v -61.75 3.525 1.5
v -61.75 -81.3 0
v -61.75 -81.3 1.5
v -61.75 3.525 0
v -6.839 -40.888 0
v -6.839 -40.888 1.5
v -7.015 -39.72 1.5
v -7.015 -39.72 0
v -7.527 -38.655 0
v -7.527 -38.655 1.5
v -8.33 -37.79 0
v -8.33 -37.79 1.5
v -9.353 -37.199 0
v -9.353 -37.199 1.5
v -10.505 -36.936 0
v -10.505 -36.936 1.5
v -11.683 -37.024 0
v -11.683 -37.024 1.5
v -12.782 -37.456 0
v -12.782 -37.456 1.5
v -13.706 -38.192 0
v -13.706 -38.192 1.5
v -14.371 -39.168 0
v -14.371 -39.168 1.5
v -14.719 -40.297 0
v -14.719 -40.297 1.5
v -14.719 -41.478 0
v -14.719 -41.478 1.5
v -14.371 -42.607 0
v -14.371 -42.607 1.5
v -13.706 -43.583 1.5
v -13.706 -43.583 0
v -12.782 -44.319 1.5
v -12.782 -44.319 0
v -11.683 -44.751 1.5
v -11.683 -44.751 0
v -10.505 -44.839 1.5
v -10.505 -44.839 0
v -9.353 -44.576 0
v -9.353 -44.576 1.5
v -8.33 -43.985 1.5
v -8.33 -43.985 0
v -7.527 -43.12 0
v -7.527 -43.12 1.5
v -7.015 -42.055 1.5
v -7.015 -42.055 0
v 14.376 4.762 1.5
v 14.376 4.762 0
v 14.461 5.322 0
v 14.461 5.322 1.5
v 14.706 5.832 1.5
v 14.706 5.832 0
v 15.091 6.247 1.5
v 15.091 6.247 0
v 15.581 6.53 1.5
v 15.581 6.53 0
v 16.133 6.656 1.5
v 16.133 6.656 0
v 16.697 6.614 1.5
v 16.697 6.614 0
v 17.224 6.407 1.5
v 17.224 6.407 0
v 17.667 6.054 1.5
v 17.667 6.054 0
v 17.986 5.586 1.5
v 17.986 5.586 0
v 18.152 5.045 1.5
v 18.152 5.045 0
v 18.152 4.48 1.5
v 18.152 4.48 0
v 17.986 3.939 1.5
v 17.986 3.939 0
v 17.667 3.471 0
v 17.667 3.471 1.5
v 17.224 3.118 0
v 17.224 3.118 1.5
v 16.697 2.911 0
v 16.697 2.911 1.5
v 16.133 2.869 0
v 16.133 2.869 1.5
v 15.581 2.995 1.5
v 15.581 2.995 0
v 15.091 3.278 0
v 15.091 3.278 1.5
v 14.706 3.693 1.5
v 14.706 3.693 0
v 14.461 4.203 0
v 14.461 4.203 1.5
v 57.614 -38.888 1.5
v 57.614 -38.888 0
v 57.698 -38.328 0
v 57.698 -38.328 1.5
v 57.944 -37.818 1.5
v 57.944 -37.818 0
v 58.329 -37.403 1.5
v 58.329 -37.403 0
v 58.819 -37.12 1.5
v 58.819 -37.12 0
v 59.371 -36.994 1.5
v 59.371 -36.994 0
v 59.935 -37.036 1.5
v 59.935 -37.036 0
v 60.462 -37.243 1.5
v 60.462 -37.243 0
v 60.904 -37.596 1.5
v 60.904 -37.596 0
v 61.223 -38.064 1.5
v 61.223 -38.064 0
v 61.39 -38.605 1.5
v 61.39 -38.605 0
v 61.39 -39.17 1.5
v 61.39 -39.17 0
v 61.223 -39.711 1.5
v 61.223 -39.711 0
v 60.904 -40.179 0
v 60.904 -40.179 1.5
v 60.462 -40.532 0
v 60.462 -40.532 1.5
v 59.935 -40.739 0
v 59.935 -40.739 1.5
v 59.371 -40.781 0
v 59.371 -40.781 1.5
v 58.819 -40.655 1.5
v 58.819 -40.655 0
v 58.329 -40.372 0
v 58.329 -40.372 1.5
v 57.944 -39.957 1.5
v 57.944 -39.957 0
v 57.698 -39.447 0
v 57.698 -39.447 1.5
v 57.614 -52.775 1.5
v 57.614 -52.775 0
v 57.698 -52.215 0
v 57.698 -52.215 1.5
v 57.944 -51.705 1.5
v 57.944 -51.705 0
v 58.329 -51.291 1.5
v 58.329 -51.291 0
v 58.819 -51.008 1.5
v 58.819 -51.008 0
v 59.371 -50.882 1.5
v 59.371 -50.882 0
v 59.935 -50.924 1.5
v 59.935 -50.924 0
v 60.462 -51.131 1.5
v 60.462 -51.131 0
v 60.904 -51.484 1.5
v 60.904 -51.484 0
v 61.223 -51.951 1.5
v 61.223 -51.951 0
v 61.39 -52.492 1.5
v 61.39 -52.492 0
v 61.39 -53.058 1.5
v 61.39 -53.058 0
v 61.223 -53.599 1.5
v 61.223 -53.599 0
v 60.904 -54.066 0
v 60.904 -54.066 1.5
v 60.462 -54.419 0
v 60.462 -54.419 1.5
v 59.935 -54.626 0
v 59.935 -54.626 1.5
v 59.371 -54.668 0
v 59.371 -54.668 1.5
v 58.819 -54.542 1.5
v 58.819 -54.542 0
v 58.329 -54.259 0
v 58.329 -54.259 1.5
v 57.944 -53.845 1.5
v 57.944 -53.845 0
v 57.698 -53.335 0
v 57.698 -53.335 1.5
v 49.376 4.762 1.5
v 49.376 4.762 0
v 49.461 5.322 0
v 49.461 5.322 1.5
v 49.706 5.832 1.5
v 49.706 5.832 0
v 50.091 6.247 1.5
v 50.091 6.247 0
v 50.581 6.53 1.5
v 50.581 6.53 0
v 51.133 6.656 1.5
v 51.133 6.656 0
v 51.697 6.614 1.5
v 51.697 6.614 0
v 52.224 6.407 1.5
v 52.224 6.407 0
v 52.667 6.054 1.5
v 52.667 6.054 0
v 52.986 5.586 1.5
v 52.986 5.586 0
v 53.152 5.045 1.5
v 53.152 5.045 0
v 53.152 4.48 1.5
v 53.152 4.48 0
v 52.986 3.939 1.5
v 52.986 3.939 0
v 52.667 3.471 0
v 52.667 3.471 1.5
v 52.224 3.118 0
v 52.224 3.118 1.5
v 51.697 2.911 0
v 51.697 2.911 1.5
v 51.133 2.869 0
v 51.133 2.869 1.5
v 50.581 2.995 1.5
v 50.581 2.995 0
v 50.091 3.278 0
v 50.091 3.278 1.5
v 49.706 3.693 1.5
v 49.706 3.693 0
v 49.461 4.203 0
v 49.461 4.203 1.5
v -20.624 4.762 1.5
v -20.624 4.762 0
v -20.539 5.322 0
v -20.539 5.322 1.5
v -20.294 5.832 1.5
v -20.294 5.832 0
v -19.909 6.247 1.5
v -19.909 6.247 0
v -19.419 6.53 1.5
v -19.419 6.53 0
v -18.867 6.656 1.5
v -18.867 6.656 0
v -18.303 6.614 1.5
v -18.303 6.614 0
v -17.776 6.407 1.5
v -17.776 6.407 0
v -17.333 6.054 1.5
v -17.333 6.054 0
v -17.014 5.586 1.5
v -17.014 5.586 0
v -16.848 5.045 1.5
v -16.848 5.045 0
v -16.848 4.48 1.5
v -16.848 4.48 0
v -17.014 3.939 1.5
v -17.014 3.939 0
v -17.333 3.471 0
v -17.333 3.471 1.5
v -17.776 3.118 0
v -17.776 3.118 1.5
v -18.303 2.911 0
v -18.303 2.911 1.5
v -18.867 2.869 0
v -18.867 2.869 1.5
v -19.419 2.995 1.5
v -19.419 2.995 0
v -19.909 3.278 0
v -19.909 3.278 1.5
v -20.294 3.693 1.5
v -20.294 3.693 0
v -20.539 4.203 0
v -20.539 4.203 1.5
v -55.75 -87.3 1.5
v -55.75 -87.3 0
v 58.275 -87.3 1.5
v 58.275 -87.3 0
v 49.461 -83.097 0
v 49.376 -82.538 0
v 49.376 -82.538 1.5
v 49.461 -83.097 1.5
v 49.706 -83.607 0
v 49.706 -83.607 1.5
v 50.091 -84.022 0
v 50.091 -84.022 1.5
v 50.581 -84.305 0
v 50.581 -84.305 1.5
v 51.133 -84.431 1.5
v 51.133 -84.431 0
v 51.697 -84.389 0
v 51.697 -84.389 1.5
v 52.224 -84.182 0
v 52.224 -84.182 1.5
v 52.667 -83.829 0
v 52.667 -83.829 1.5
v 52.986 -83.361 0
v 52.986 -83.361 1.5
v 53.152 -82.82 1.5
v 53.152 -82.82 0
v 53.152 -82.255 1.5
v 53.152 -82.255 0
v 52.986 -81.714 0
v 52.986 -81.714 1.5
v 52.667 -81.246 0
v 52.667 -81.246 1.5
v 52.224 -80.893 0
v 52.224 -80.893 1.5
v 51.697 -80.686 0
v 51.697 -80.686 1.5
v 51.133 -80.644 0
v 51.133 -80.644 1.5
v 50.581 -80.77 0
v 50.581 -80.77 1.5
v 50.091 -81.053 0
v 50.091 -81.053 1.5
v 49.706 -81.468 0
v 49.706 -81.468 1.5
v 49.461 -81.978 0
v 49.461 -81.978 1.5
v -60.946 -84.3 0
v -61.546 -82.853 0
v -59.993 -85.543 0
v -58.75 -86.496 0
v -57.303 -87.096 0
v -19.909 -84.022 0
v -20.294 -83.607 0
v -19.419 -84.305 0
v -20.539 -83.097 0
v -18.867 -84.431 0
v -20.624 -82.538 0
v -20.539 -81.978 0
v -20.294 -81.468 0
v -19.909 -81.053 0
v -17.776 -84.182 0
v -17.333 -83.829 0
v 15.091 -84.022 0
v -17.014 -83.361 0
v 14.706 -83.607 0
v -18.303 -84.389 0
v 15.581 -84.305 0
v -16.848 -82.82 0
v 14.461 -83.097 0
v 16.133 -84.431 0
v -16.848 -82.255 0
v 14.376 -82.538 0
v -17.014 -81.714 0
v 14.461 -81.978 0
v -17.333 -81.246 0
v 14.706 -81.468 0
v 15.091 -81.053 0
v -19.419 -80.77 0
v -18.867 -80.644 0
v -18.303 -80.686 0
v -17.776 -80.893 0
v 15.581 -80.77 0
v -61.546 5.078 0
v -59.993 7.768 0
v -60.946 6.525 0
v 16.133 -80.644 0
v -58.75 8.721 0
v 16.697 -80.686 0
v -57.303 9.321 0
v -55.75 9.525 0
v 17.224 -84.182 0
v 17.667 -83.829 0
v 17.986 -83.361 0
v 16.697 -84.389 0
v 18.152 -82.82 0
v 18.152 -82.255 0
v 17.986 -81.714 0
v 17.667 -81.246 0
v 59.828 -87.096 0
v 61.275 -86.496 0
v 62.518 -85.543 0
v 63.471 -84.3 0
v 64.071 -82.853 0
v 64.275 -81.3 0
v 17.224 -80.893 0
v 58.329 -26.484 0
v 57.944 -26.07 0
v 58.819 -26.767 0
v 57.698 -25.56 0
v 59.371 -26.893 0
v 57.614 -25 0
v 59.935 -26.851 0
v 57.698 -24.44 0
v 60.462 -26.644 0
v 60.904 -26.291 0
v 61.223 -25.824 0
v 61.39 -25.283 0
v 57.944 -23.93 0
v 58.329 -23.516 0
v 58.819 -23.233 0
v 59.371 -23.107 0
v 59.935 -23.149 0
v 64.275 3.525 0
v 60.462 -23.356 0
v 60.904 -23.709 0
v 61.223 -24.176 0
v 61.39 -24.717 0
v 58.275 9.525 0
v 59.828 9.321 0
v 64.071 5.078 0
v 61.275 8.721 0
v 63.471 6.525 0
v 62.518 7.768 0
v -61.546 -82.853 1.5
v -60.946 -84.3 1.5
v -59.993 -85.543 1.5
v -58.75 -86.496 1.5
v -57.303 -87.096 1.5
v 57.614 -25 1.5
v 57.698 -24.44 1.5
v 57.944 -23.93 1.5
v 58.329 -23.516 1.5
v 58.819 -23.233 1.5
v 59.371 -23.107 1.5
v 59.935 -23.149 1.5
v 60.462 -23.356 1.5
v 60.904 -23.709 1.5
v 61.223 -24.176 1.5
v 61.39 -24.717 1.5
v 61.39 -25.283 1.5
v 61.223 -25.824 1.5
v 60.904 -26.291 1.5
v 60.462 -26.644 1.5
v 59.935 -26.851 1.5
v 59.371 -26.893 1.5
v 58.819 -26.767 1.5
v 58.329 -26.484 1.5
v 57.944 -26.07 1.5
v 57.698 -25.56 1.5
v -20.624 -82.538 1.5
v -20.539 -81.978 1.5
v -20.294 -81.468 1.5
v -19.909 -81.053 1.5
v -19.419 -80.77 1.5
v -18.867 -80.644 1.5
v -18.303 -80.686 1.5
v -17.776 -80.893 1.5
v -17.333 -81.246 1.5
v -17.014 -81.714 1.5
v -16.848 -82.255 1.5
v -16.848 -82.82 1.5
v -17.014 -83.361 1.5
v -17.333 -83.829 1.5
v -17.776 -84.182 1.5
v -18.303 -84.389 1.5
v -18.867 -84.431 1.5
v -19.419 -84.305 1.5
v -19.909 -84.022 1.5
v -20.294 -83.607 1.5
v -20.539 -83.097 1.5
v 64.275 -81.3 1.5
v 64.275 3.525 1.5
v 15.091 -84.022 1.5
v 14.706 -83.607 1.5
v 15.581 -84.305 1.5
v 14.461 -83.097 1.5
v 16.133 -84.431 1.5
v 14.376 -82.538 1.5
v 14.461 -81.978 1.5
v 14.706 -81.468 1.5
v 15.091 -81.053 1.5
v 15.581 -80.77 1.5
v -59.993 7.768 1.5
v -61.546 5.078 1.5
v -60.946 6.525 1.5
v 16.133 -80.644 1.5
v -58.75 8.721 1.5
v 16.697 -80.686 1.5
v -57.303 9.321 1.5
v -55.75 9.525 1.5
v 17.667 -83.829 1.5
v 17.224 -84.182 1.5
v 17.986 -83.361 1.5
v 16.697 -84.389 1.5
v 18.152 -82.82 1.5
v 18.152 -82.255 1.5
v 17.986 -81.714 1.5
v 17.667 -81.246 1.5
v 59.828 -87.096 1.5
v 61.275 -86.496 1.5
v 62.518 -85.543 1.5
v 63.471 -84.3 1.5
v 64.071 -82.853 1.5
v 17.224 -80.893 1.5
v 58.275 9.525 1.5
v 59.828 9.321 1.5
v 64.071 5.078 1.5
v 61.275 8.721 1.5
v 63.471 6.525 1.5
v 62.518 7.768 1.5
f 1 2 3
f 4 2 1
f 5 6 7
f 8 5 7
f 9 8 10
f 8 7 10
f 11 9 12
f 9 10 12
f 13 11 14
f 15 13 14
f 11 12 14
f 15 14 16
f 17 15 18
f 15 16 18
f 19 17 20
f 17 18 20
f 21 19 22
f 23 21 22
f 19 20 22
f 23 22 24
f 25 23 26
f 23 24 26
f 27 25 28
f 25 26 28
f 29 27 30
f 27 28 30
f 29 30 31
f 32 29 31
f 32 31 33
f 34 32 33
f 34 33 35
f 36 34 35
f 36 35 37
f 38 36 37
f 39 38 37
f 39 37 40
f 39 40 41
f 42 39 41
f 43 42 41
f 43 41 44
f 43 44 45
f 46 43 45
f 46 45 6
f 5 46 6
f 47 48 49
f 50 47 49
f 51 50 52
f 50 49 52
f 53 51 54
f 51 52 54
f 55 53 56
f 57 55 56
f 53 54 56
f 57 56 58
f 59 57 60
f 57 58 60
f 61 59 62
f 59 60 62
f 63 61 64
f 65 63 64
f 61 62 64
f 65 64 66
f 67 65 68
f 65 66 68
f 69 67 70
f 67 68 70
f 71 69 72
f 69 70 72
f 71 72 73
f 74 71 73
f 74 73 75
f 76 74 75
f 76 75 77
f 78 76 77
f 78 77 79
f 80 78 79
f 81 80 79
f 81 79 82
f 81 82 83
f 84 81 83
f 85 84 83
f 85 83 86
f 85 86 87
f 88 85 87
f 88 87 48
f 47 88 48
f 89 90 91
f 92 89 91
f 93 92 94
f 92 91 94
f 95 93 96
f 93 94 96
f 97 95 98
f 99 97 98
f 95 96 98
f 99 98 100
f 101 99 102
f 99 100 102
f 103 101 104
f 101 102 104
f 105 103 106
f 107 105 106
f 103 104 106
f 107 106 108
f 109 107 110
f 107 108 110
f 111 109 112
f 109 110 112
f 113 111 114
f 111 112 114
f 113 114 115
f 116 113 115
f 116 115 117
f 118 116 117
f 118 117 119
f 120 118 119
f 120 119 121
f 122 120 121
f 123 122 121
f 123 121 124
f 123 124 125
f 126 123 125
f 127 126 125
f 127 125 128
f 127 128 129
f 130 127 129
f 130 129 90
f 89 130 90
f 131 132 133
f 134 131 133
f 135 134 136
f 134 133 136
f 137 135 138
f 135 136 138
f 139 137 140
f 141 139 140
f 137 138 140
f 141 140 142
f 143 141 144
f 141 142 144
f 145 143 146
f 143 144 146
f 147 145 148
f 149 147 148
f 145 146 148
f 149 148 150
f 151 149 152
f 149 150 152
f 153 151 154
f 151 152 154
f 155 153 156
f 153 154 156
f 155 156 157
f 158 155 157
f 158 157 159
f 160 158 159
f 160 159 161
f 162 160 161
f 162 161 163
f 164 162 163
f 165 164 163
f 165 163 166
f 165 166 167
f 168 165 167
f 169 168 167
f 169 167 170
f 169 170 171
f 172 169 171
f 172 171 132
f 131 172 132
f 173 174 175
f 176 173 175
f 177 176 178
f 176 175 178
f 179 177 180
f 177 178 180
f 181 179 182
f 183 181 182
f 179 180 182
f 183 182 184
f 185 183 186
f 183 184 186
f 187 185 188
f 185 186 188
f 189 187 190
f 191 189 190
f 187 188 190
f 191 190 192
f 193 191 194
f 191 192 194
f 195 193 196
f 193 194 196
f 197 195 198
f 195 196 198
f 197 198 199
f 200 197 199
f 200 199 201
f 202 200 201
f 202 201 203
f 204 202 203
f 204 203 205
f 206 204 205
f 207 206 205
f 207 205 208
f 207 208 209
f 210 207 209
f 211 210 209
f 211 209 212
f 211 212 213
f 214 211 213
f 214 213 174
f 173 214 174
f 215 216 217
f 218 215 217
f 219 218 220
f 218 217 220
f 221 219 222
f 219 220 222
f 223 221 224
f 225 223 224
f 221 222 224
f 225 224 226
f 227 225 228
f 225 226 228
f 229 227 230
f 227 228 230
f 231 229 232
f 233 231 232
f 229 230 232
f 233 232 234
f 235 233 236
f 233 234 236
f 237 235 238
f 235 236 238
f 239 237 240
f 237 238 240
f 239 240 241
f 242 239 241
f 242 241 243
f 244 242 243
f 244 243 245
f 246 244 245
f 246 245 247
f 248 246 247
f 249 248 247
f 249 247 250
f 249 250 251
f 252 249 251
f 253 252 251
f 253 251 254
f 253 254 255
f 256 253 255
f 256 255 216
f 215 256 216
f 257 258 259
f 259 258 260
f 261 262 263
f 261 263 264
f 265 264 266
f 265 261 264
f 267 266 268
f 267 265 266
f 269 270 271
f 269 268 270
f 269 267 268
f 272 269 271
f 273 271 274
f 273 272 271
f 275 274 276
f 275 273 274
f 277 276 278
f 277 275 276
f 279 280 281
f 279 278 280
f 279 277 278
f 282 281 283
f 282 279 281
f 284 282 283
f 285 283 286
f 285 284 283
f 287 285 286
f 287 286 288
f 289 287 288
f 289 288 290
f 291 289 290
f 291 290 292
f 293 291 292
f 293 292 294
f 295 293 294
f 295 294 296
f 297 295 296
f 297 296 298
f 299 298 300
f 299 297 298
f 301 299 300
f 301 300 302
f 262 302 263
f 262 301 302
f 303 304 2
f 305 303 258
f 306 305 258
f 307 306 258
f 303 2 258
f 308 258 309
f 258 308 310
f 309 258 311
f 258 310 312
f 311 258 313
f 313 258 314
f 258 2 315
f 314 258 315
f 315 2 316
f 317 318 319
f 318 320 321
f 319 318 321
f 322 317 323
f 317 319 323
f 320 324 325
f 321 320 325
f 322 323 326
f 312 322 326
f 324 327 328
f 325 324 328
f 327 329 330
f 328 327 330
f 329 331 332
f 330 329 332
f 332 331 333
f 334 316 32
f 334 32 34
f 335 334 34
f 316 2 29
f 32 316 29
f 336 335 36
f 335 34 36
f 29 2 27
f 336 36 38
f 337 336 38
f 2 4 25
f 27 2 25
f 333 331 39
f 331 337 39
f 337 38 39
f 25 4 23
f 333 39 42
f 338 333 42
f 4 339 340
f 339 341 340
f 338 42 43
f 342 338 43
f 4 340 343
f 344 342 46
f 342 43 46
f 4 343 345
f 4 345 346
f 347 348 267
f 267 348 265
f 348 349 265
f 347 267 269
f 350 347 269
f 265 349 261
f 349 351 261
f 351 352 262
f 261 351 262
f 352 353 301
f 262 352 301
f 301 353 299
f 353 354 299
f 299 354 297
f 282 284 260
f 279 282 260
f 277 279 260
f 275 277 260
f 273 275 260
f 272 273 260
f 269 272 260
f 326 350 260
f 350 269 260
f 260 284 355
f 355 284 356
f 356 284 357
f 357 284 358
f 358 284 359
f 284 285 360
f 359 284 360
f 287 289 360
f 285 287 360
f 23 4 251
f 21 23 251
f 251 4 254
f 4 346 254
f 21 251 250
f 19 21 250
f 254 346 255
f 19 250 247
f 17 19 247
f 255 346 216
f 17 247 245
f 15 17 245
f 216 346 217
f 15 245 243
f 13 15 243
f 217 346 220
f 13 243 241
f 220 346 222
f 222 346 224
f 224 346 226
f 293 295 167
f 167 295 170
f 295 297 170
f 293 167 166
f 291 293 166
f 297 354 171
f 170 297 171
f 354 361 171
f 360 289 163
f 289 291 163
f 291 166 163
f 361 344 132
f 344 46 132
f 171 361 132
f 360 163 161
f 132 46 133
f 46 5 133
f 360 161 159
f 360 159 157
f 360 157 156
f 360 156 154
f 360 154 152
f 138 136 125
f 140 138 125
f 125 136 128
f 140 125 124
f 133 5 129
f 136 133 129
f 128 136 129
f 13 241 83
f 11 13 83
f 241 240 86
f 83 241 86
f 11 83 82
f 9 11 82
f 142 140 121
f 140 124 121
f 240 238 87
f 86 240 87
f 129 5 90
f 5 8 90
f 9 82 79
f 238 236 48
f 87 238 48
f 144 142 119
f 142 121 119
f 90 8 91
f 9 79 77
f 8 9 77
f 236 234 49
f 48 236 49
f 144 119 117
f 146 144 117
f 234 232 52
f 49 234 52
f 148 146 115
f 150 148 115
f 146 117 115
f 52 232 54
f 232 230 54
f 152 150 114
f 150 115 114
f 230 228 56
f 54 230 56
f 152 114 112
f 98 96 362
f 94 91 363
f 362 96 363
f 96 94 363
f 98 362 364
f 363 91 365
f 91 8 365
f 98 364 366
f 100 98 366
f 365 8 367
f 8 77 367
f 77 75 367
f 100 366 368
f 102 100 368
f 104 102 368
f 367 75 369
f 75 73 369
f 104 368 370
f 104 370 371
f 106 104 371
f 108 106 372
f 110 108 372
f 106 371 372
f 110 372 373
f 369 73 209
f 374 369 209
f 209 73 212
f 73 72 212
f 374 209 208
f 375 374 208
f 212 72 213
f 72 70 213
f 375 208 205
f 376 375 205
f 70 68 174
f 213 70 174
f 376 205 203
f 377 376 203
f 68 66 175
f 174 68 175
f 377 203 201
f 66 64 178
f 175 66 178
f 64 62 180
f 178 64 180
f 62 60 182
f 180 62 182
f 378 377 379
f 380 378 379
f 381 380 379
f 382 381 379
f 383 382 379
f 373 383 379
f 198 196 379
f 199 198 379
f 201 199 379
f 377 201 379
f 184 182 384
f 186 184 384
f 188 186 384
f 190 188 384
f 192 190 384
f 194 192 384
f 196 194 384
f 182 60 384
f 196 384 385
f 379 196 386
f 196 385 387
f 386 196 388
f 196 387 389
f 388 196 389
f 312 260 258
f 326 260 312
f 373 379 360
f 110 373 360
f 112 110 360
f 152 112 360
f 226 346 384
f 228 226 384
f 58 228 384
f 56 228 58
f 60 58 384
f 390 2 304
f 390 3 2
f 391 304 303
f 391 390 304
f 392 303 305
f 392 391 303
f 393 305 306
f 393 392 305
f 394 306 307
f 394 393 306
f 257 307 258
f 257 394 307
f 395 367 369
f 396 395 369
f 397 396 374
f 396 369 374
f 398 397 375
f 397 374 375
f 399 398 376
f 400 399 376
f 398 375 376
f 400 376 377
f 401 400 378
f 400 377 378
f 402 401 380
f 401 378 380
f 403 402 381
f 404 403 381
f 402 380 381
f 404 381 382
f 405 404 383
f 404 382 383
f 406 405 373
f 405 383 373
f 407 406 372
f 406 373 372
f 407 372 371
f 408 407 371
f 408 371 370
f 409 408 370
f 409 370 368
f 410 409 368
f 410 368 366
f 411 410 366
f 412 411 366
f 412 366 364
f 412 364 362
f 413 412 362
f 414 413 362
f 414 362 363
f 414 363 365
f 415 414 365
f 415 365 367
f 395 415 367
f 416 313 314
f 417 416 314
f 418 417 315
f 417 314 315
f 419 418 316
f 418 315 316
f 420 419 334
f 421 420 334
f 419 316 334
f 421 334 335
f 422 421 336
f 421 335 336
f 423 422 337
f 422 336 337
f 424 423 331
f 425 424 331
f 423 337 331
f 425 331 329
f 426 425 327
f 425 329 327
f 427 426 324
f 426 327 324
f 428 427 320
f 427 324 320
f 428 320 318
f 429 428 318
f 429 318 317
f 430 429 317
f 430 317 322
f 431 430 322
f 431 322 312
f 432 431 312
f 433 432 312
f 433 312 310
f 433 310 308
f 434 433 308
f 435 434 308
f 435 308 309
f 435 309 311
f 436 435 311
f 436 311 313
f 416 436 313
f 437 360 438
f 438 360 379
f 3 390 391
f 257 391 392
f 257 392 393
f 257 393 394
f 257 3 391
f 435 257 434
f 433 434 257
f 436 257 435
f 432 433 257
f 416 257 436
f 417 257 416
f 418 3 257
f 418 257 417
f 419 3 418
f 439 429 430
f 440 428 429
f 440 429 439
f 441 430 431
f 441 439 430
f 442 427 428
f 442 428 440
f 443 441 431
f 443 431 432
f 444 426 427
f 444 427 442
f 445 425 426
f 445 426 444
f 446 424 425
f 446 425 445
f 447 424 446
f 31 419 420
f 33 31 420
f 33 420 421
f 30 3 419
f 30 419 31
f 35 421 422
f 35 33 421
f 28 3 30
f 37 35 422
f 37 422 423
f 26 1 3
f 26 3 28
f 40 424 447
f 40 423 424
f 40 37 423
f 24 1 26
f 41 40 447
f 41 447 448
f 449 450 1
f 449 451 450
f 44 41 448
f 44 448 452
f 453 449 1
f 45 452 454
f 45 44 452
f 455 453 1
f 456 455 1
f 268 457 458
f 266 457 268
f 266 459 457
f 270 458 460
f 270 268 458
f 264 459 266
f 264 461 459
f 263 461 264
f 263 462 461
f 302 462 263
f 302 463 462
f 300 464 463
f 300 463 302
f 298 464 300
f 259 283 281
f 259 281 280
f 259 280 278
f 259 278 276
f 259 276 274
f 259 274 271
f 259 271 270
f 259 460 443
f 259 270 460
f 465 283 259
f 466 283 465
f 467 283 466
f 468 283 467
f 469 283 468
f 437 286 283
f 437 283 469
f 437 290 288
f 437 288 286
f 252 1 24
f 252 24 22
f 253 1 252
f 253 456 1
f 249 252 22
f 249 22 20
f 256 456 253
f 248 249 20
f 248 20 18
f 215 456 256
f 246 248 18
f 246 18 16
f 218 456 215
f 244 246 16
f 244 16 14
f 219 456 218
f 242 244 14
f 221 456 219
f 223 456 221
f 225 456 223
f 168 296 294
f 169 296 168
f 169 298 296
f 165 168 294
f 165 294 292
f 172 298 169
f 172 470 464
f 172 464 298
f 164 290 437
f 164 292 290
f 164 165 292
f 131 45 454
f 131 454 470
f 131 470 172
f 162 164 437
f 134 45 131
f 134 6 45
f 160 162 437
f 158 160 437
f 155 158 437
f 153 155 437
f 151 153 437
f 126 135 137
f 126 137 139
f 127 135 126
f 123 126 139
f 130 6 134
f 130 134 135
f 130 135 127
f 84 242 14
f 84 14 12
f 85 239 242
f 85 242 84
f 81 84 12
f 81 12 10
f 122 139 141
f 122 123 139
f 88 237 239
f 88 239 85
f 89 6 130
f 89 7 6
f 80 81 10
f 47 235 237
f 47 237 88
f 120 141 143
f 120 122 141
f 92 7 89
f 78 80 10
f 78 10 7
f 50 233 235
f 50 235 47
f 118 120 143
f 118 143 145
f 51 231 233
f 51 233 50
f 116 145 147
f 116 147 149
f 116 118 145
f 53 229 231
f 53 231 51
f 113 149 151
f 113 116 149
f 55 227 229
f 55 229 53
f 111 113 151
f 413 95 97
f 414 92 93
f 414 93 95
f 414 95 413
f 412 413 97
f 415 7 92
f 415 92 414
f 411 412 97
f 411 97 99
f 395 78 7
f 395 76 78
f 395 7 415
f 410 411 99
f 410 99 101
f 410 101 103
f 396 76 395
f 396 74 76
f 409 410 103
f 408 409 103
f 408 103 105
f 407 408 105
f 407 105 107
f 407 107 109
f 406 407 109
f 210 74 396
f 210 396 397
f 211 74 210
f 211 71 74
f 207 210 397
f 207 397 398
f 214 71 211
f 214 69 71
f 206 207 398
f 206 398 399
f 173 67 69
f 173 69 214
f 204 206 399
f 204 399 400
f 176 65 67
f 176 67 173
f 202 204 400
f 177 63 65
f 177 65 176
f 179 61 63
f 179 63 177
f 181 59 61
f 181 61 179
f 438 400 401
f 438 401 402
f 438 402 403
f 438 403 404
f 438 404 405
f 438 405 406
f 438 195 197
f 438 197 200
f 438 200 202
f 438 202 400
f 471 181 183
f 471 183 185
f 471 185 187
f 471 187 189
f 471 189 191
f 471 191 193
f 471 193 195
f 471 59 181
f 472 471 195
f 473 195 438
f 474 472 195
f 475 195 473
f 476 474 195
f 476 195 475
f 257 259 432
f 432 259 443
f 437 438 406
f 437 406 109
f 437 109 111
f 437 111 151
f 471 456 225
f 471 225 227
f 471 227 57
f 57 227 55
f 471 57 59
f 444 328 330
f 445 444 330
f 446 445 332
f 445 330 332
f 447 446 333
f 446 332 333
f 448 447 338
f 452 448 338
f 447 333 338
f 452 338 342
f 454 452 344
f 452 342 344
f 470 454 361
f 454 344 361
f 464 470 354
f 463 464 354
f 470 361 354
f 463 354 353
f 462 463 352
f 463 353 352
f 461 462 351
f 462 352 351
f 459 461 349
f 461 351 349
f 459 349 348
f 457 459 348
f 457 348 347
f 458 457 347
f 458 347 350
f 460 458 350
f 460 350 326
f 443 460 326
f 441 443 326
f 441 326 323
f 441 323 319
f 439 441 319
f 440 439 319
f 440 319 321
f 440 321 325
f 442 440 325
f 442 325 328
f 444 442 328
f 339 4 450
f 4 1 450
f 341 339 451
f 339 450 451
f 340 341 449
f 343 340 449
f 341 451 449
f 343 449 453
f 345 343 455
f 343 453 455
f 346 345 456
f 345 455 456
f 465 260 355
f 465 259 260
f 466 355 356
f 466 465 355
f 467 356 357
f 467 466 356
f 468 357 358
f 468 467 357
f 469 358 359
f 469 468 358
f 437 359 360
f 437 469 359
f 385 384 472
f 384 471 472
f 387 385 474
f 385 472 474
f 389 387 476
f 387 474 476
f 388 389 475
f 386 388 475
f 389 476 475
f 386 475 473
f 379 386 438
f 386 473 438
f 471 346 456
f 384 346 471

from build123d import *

# Parameters (mm, degrees)
SKETCH1_W               = 126.025
SKETCH1_H               = 96.825
BOSS_EXTRUDE1_DEPTH     = 1.5
F_6_CLEARANCE_HOLE1_D   = 3.7973
SIDEPANEL_PATTERN_COUNT = 3
SIDEPANEL_PATTERN_PITCH = 35
MIRROR1_COPY_1_D        = 3.7973
MIRROR1_COPY_2_D        = 3.7973
F_6_CLEARANCE_HOLE2_D   = 3.7973
LPATTERN2_COUNT         = 3
LPATTERN2_PITCH         = 13.8875
FILLET1_R               = 6
SKETCH9_R               = 3.9624
CUT_EXTRUDE1_DEPTH      = 109.41962749


with BuildPart() as part:
    # Sketch1 → Boss-Extrude1 (new body)
    with BuildSketch(Plane.XY):
        with Locations((1.2625, -38.8875)):
            Rectangle(SKETCH1_W, SKETCH1_H)
    extrude(amount=BOSS_EXTRUDE1_DEPTH)

    # #6 Clearance Hole1 (through all)
    with Locations(Plane.XY.offset(1.5)):
        with Locations((51.275, 4.7625)):
            f_6_clearance_hole1 = Hole(F_6_CLEARANCE_HOLE1_D / 2)

    # Sidepanel Pattern: #6 Clearance Hole1 ×3
    with Locations(*[(-i * SIDEPANEL_PATTERN_PITCH, 0, 0) for i in range(1, SIDEPANEL_PATTERN_COUNT)]):
        add(f_6_clearance_hole1, mode=Mode.SUBTRACT)

    # Mirror1: #6 Clearance Hole1 across plane
    add(f_6_clearance_hole1.mirror(Plane.ZX.offset(-38.8875)), mode=Mode.SUBTRACT)

    # Mirror1 copy 1 (through all)
    with Locations(Plane(origin=(-35, -77.775, 1.5), x_dir=(1, 0, 0), z_dir=(0, 0, 1))):
        with Locations((51.275, -4.7625)):
            Hole(MIRROR1_COPY_1_D / 2)

    # Mirror1 copy 2 (through all)
    with Locations(Plane(origin=(-70, -77.775, 1.5), x_dir=(1, 0, 0), z_dir=(0, 0, 1))):
        with Locations((51.275, -4.7625)):
            Hole(MIRROR1_COPY_2_D / 2)

    # #6 Clearance Hole2 (through all)
    with Locations(Plane.XY.offset(1.5)):
        with Locations((59.5125, -25)):
            f_6_clearance_hole2 = Hole(F_6_CLEARANCE_HOLE2_D / 2)

    # LPattern2: #6 Clearance Hole2 ×3
    with Locations(*[(0, -i * LPATTERN2_PITCH, 0) for i in range(1, LPATTERN2_COUNT)]):
        add(f_6_clearance_hole2, mode=Mode.SUBTRACT)

    # Fillet1
    fillet1_edges = [part.edges().sort_by_distance(p)[0] for p in [
        (-61.75, 9.525, 0.75),
        (64.275, 9.525, 0.75),
        (64.275, -87.3, 0.75),
        (-61.75, -87.3, 0.75),
    ]]
    fillet(fillet1_edges, radius=FILLET1_R)

    # Sketch9 → Cut-Extrude1 (cut, through all)
    with BuildSketch(Plane.XY.offset(1.5)):
        with Locations((-10.800946897, -40.88752178)):
            Circle(SKETCH9_R)
    extrude(amount=-CUT_EXTRUDE1_DEPTH, mode=Mode.SUBTRACT)


solid = part.part
